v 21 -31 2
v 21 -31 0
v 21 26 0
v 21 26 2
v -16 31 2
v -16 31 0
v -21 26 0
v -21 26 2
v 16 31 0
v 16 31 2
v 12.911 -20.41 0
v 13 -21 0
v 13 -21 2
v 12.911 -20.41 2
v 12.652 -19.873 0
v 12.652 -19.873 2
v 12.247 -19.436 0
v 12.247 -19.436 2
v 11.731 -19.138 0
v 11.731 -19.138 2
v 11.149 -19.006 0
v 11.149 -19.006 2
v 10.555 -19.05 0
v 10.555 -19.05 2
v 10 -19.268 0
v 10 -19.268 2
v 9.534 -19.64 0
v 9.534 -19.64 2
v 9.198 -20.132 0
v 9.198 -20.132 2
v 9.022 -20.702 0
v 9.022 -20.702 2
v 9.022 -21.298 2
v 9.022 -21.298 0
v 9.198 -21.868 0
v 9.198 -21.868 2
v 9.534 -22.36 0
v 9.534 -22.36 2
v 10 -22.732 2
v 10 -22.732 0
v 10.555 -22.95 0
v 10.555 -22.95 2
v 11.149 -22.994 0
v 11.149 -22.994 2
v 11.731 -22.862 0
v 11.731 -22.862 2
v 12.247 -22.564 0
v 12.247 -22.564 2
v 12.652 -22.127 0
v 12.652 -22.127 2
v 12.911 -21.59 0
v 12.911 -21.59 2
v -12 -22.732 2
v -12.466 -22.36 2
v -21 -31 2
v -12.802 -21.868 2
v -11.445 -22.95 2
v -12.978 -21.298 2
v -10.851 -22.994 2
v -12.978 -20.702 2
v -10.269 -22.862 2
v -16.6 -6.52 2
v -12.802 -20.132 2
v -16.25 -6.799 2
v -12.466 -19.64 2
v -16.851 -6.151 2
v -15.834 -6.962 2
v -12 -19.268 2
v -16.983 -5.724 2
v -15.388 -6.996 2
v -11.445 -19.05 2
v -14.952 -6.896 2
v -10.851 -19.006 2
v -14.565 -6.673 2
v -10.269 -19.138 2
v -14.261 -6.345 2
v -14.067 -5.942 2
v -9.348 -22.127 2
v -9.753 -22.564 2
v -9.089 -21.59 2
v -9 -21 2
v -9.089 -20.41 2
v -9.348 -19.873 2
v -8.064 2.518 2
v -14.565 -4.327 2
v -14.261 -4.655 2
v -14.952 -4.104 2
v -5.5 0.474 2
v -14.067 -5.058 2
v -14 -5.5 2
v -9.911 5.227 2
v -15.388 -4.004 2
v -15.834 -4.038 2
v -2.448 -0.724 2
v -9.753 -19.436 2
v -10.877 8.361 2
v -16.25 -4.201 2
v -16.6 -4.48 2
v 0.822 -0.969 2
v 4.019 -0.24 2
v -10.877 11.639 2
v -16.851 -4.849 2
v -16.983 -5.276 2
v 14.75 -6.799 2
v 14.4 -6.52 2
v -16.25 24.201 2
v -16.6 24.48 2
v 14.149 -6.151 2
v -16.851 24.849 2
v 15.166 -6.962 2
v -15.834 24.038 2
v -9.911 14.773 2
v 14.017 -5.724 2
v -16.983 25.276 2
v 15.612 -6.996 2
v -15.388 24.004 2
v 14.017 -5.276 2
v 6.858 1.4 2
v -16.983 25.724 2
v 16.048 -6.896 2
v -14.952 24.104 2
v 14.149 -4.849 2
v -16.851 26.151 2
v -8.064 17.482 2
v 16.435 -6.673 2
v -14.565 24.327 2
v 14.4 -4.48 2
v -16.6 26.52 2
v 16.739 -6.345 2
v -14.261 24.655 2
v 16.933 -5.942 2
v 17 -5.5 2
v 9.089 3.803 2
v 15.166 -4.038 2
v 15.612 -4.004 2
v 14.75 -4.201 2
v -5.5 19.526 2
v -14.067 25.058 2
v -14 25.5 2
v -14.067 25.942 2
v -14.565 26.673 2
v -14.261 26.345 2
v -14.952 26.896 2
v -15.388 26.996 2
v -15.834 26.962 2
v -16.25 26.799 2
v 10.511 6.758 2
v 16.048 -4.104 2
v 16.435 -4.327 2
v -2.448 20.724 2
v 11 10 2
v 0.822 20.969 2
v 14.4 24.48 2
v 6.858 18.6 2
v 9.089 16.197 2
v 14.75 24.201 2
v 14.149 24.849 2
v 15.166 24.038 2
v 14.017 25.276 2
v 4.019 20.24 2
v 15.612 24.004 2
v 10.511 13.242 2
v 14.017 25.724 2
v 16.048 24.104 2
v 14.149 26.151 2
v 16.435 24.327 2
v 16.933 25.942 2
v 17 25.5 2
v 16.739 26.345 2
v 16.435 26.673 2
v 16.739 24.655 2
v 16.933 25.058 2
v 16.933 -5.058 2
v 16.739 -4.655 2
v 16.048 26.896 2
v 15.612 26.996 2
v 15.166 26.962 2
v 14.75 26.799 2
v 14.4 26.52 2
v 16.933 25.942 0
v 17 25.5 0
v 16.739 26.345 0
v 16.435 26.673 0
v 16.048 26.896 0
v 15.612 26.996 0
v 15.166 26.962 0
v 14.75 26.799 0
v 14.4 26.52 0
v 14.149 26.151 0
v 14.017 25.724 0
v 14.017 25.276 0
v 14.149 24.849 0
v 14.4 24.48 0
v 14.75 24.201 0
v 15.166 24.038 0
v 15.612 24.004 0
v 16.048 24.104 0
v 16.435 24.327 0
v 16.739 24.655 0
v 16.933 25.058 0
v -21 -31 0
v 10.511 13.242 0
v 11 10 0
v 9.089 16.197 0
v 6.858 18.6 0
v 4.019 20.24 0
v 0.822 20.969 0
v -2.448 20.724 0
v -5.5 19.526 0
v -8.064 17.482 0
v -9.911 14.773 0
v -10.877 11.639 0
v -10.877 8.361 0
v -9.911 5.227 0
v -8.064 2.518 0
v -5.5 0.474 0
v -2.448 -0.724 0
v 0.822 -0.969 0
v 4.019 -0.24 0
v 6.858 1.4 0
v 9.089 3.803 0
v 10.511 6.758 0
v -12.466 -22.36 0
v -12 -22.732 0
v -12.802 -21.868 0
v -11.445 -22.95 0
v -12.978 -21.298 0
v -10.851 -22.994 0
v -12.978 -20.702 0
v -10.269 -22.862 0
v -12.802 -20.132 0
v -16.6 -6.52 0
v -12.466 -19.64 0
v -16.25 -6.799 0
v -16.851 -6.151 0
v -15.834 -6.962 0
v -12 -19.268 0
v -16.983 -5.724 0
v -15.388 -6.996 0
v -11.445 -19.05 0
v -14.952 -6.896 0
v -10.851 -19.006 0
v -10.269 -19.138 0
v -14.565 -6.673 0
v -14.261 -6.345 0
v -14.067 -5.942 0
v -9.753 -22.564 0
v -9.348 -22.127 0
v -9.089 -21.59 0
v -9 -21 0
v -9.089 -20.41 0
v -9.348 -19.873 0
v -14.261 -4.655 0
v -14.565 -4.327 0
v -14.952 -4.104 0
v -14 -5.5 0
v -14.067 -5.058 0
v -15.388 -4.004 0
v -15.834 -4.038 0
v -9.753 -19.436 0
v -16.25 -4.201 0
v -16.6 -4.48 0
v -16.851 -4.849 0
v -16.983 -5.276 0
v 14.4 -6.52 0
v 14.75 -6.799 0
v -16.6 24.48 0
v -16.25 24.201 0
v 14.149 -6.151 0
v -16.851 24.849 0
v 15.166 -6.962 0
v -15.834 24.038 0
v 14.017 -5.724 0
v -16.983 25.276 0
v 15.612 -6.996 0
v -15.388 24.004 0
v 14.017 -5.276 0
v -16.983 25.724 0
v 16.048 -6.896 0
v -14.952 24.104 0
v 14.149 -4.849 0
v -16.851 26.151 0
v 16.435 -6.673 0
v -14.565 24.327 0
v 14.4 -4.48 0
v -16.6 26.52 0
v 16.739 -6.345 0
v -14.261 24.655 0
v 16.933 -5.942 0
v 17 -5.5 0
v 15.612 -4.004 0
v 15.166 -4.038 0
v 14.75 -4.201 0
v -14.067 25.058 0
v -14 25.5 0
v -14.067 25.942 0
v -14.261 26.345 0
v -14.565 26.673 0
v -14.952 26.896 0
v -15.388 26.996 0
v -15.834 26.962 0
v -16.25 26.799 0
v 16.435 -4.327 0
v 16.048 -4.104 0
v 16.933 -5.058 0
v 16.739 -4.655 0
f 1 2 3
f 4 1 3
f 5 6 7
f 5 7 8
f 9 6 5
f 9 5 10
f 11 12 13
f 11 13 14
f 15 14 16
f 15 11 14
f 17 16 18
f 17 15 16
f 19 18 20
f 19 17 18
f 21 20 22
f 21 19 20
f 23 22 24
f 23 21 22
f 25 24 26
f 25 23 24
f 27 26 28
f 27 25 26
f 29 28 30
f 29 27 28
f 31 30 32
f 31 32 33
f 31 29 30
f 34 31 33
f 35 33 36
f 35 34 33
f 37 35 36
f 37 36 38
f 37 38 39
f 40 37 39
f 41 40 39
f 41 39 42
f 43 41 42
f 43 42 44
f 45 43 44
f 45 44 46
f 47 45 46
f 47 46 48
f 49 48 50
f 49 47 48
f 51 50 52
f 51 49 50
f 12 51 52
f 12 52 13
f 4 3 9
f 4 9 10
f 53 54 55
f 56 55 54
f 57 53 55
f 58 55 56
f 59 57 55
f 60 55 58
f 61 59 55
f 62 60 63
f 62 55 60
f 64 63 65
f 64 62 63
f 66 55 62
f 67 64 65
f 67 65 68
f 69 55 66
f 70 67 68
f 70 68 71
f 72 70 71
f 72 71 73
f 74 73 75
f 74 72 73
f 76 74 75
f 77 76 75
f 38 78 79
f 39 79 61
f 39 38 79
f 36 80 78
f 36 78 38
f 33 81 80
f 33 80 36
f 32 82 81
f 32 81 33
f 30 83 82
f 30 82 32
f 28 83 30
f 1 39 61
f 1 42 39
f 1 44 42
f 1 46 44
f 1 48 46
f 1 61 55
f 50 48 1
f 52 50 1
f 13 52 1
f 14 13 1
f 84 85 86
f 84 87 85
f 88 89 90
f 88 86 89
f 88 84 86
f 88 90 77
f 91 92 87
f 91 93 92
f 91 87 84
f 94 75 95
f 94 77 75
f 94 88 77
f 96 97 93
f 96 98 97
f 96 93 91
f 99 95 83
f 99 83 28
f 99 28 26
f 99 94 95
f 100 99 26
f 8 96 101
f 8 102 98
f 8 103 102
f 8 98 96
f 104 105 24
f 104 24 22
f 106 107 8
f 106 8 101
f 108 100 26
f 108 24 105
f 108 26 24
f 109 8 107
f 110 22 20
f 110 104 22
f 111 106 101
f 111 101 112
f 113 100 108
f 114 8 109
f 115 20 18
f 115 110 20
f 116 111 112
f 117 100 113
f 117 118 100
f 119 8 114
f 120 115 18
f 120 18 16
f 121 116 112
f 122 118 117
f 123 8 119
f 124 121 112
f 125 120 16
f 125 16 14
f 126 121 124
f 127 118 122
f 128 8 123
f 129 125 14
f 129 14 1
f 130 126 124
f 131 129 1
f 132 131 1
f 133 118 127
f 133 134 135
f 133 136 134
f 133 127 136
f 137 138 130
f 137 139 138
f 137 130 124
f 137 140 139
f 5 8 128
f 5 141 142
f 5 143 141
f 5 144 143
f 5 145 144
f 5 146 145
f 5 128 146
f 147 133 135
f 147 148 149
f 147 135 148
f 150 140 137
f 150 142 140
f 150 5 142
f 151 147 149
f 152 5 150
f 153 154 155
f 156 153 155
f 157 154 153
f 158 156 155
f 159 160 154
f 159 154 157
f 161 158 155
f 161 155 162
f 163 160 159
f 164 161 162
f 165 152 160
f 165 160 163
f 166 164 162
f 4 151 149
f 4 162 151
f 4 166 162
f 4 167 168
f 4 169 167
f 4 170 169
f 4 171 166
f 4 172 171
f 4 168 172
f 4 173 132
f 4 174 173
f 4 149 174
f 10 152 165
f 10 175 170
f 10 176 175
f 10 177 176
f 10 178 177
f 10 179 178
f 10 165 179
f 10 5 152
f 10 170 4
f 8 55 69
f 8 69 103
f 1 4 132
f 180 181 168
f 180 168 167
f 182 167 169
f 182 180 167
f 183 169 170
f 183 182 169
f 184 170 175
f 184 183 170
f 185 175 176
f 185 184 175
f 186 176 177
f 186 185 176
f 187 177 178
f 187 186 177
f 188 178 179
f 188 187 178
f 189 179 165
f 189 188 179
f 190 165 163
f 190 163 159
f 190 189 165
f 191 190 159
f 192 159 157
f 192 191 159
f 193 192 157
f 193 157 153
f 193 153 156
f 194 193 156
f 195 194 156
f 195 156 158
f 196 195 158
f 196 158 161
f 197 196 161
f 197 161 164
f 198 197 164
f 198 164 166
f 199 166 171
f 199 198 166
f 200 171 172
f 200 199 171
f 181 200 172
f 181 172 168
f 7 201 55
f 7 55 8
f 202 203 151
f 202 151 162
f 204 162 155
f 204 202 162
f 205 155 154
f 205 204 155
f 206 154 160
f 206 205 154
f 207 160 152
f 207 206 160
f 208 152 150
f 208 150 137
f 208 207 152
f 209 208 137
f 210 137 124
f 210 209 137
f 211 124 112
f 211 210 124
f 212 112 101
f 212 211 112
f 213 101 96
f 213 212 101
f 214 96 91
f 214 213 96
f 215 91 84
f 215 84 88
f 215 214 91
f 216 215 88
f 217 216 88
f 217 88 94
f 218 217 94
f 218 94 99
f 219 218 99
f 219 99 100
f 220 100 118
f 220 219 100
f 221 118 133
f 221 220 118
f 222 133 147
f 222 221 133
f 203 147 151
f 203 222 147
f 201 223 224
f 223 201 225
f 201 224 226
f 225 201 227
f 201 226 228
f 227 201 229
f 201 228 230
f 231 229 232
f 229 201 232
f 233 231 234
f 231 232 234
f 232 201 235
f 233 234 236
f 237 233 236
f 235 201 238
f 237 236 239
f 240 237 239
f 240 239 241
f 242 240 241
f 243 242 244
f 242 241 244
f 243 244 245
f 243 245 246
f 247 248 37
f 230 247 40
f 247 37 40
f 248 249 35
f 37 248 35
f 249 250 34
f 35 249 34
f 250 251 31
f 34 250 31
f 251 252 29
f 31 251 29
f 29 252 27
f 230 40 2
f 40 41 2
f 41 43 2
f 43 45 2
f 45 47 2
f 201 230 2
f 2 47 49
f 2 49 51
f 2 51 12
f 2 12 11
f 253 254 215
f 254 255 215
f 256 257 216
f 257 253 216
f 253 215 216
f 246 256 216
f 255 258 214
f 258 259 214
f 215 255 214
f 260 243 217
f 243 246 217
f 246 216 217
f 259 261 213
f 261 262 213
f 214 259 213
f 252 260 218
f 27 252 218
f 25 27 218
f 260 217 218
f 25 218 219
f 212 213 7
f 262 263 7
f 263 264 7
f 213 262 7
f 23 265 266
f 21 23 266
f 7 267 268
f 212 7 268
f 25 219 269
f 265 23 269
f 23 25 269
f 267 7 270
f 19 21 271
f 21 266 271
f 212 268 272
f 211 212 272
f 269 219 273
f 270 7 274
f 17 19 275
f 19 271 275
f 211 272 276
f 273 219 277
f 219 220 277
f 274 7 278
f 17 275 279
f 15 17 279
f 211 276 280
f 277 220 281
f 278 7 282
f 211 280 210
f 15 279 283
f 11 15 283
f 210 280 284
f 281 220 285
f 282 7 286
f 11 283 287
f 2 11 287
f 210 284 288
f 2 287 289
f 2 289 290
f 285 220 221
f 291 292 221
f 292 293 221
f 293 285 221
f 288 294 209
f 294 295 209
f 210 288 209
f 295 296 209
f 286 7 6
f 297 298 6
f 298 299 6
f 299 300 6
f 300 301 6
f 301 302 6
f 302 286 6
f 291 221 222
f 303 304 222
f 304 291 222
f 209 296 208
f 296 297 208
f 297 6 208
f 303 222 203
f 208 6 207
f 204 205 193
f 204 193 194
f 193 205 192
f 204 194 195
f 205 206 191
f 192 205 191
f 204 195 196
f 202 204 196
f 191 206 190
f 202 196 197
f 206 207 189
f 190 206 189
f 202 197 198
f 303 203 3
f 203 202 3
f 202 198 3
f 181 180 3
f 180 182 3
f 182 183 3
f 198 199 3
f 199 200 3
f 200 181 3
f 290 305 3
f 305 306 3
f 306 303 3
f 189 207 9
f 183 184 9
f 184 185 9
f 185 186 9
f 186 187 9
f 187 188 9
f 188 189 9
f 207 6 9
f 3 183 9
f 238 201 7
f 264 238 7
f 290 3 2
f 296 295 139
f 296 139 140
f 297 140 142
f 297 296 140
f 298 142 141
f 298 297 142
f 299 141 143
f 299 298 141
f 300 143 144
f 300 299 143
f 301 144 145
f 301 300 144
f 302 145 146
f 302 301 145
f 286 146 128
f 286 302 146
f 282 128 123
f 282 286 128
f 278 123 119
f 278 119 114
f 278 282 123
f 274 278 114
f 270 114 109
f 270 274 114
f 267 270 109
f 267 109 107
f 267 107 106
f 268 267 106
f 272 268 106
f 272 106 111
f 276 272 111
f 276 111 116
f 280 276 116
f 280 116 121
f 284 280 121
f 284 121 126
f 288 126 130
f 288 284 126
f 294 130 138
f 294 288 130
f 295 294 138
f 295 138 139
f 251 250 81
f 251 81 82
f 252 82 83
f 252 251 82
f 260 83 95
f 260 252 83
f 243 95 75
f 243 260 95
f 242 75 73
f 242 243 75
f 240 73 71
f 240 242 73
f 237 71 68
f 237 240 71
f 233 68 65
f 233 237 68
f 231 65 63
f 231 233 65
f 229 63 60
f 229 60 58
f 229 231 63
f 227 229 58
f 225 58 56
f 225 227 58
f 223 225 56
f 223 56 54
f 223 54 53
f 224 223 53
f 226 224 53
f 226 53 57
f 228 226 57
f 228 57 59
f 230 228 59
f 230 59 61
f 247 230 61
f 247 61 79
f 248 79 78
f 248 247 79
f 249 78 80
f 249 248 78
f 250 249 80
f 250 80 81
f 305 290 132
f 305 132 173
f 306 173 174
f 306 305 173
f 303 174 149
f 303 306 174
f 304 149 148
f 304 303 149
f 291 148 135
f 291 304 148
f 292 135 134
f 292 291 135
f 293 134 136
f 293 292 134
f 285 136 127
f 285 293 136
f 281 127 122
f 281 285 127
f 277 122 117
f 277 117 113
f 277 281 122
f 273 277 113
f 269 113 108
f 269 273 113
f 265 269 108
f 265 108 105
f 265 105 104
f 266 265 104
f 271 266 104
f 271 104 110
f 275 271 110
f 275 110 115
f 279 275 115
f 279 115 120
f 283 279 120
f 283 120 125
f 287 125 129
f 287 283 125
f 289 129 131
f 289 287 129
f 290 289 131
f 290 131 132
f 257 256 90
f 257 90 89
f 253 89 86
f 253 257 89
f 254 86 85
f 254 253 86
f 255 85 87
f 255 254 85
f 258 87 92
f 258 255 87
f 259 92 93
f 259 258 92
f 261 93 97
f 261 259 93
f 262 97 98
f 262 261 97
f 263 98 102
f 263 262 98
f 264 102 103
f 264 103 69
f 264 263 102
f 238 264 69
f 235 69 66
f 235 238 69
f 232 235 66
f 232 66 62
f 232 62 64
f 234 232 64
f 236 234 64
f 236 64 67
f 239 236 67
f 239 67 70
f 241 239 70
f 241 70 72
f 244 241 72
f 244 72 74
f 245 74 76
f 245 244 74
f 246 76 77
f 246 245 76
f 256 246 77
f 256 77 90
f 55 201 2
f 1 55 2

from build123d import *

# Parameters (mm, degrees)
F0_W     = 42
F0_H     = 62
F0_R     = 2
F0_R_2   = 1.5
F0_R_3   = 11
F1_DEPTH = 2
F2_SIZE  = 5


with BuildPart() as f1:
    # F0 (on Top) → F1 (new body)
    with BuildSketch(Plane.XY):
        Rectangle(F0_W, F0_H)
        with Locations((-11, -21)):
            Circle(F0_R, mode=Mode.SUBTRACT)
        with Locations((-15.5, -5.5)):
            Circle(F0_R_2, mode=Mode.SUBTRACT)
        with Locations((11, -21)):
            Circle(F0_R, mode=Mode.SUBTRACT)
        with Locations((15.5, -5.5)):
            Circle(F0_R_2, mode=Mode.SUBTRACT)
        with Locations((-15.5, 25.5)):
            Circle(F0_R_2, mode=Mode.SUBTRACT)
        with Locations((0, 10)):
            Circle(F0_R_3, mode=Mode.SUBTRACT)
        with Locations((15.5, 25.5)):
            Circle(F0_R_2, mode=Mode.SUBTRACT)
    extrude(amount=F1_DEPTH)

    # F2
    f2_edges = [f1.edges().sort_by_distance(p)[0] for p in [
        (21, 31, 1),
        (-21, 31, 1),
    ]]
    chamfer(f2_edges, length=F2_SIZE)


solid = f1.part
